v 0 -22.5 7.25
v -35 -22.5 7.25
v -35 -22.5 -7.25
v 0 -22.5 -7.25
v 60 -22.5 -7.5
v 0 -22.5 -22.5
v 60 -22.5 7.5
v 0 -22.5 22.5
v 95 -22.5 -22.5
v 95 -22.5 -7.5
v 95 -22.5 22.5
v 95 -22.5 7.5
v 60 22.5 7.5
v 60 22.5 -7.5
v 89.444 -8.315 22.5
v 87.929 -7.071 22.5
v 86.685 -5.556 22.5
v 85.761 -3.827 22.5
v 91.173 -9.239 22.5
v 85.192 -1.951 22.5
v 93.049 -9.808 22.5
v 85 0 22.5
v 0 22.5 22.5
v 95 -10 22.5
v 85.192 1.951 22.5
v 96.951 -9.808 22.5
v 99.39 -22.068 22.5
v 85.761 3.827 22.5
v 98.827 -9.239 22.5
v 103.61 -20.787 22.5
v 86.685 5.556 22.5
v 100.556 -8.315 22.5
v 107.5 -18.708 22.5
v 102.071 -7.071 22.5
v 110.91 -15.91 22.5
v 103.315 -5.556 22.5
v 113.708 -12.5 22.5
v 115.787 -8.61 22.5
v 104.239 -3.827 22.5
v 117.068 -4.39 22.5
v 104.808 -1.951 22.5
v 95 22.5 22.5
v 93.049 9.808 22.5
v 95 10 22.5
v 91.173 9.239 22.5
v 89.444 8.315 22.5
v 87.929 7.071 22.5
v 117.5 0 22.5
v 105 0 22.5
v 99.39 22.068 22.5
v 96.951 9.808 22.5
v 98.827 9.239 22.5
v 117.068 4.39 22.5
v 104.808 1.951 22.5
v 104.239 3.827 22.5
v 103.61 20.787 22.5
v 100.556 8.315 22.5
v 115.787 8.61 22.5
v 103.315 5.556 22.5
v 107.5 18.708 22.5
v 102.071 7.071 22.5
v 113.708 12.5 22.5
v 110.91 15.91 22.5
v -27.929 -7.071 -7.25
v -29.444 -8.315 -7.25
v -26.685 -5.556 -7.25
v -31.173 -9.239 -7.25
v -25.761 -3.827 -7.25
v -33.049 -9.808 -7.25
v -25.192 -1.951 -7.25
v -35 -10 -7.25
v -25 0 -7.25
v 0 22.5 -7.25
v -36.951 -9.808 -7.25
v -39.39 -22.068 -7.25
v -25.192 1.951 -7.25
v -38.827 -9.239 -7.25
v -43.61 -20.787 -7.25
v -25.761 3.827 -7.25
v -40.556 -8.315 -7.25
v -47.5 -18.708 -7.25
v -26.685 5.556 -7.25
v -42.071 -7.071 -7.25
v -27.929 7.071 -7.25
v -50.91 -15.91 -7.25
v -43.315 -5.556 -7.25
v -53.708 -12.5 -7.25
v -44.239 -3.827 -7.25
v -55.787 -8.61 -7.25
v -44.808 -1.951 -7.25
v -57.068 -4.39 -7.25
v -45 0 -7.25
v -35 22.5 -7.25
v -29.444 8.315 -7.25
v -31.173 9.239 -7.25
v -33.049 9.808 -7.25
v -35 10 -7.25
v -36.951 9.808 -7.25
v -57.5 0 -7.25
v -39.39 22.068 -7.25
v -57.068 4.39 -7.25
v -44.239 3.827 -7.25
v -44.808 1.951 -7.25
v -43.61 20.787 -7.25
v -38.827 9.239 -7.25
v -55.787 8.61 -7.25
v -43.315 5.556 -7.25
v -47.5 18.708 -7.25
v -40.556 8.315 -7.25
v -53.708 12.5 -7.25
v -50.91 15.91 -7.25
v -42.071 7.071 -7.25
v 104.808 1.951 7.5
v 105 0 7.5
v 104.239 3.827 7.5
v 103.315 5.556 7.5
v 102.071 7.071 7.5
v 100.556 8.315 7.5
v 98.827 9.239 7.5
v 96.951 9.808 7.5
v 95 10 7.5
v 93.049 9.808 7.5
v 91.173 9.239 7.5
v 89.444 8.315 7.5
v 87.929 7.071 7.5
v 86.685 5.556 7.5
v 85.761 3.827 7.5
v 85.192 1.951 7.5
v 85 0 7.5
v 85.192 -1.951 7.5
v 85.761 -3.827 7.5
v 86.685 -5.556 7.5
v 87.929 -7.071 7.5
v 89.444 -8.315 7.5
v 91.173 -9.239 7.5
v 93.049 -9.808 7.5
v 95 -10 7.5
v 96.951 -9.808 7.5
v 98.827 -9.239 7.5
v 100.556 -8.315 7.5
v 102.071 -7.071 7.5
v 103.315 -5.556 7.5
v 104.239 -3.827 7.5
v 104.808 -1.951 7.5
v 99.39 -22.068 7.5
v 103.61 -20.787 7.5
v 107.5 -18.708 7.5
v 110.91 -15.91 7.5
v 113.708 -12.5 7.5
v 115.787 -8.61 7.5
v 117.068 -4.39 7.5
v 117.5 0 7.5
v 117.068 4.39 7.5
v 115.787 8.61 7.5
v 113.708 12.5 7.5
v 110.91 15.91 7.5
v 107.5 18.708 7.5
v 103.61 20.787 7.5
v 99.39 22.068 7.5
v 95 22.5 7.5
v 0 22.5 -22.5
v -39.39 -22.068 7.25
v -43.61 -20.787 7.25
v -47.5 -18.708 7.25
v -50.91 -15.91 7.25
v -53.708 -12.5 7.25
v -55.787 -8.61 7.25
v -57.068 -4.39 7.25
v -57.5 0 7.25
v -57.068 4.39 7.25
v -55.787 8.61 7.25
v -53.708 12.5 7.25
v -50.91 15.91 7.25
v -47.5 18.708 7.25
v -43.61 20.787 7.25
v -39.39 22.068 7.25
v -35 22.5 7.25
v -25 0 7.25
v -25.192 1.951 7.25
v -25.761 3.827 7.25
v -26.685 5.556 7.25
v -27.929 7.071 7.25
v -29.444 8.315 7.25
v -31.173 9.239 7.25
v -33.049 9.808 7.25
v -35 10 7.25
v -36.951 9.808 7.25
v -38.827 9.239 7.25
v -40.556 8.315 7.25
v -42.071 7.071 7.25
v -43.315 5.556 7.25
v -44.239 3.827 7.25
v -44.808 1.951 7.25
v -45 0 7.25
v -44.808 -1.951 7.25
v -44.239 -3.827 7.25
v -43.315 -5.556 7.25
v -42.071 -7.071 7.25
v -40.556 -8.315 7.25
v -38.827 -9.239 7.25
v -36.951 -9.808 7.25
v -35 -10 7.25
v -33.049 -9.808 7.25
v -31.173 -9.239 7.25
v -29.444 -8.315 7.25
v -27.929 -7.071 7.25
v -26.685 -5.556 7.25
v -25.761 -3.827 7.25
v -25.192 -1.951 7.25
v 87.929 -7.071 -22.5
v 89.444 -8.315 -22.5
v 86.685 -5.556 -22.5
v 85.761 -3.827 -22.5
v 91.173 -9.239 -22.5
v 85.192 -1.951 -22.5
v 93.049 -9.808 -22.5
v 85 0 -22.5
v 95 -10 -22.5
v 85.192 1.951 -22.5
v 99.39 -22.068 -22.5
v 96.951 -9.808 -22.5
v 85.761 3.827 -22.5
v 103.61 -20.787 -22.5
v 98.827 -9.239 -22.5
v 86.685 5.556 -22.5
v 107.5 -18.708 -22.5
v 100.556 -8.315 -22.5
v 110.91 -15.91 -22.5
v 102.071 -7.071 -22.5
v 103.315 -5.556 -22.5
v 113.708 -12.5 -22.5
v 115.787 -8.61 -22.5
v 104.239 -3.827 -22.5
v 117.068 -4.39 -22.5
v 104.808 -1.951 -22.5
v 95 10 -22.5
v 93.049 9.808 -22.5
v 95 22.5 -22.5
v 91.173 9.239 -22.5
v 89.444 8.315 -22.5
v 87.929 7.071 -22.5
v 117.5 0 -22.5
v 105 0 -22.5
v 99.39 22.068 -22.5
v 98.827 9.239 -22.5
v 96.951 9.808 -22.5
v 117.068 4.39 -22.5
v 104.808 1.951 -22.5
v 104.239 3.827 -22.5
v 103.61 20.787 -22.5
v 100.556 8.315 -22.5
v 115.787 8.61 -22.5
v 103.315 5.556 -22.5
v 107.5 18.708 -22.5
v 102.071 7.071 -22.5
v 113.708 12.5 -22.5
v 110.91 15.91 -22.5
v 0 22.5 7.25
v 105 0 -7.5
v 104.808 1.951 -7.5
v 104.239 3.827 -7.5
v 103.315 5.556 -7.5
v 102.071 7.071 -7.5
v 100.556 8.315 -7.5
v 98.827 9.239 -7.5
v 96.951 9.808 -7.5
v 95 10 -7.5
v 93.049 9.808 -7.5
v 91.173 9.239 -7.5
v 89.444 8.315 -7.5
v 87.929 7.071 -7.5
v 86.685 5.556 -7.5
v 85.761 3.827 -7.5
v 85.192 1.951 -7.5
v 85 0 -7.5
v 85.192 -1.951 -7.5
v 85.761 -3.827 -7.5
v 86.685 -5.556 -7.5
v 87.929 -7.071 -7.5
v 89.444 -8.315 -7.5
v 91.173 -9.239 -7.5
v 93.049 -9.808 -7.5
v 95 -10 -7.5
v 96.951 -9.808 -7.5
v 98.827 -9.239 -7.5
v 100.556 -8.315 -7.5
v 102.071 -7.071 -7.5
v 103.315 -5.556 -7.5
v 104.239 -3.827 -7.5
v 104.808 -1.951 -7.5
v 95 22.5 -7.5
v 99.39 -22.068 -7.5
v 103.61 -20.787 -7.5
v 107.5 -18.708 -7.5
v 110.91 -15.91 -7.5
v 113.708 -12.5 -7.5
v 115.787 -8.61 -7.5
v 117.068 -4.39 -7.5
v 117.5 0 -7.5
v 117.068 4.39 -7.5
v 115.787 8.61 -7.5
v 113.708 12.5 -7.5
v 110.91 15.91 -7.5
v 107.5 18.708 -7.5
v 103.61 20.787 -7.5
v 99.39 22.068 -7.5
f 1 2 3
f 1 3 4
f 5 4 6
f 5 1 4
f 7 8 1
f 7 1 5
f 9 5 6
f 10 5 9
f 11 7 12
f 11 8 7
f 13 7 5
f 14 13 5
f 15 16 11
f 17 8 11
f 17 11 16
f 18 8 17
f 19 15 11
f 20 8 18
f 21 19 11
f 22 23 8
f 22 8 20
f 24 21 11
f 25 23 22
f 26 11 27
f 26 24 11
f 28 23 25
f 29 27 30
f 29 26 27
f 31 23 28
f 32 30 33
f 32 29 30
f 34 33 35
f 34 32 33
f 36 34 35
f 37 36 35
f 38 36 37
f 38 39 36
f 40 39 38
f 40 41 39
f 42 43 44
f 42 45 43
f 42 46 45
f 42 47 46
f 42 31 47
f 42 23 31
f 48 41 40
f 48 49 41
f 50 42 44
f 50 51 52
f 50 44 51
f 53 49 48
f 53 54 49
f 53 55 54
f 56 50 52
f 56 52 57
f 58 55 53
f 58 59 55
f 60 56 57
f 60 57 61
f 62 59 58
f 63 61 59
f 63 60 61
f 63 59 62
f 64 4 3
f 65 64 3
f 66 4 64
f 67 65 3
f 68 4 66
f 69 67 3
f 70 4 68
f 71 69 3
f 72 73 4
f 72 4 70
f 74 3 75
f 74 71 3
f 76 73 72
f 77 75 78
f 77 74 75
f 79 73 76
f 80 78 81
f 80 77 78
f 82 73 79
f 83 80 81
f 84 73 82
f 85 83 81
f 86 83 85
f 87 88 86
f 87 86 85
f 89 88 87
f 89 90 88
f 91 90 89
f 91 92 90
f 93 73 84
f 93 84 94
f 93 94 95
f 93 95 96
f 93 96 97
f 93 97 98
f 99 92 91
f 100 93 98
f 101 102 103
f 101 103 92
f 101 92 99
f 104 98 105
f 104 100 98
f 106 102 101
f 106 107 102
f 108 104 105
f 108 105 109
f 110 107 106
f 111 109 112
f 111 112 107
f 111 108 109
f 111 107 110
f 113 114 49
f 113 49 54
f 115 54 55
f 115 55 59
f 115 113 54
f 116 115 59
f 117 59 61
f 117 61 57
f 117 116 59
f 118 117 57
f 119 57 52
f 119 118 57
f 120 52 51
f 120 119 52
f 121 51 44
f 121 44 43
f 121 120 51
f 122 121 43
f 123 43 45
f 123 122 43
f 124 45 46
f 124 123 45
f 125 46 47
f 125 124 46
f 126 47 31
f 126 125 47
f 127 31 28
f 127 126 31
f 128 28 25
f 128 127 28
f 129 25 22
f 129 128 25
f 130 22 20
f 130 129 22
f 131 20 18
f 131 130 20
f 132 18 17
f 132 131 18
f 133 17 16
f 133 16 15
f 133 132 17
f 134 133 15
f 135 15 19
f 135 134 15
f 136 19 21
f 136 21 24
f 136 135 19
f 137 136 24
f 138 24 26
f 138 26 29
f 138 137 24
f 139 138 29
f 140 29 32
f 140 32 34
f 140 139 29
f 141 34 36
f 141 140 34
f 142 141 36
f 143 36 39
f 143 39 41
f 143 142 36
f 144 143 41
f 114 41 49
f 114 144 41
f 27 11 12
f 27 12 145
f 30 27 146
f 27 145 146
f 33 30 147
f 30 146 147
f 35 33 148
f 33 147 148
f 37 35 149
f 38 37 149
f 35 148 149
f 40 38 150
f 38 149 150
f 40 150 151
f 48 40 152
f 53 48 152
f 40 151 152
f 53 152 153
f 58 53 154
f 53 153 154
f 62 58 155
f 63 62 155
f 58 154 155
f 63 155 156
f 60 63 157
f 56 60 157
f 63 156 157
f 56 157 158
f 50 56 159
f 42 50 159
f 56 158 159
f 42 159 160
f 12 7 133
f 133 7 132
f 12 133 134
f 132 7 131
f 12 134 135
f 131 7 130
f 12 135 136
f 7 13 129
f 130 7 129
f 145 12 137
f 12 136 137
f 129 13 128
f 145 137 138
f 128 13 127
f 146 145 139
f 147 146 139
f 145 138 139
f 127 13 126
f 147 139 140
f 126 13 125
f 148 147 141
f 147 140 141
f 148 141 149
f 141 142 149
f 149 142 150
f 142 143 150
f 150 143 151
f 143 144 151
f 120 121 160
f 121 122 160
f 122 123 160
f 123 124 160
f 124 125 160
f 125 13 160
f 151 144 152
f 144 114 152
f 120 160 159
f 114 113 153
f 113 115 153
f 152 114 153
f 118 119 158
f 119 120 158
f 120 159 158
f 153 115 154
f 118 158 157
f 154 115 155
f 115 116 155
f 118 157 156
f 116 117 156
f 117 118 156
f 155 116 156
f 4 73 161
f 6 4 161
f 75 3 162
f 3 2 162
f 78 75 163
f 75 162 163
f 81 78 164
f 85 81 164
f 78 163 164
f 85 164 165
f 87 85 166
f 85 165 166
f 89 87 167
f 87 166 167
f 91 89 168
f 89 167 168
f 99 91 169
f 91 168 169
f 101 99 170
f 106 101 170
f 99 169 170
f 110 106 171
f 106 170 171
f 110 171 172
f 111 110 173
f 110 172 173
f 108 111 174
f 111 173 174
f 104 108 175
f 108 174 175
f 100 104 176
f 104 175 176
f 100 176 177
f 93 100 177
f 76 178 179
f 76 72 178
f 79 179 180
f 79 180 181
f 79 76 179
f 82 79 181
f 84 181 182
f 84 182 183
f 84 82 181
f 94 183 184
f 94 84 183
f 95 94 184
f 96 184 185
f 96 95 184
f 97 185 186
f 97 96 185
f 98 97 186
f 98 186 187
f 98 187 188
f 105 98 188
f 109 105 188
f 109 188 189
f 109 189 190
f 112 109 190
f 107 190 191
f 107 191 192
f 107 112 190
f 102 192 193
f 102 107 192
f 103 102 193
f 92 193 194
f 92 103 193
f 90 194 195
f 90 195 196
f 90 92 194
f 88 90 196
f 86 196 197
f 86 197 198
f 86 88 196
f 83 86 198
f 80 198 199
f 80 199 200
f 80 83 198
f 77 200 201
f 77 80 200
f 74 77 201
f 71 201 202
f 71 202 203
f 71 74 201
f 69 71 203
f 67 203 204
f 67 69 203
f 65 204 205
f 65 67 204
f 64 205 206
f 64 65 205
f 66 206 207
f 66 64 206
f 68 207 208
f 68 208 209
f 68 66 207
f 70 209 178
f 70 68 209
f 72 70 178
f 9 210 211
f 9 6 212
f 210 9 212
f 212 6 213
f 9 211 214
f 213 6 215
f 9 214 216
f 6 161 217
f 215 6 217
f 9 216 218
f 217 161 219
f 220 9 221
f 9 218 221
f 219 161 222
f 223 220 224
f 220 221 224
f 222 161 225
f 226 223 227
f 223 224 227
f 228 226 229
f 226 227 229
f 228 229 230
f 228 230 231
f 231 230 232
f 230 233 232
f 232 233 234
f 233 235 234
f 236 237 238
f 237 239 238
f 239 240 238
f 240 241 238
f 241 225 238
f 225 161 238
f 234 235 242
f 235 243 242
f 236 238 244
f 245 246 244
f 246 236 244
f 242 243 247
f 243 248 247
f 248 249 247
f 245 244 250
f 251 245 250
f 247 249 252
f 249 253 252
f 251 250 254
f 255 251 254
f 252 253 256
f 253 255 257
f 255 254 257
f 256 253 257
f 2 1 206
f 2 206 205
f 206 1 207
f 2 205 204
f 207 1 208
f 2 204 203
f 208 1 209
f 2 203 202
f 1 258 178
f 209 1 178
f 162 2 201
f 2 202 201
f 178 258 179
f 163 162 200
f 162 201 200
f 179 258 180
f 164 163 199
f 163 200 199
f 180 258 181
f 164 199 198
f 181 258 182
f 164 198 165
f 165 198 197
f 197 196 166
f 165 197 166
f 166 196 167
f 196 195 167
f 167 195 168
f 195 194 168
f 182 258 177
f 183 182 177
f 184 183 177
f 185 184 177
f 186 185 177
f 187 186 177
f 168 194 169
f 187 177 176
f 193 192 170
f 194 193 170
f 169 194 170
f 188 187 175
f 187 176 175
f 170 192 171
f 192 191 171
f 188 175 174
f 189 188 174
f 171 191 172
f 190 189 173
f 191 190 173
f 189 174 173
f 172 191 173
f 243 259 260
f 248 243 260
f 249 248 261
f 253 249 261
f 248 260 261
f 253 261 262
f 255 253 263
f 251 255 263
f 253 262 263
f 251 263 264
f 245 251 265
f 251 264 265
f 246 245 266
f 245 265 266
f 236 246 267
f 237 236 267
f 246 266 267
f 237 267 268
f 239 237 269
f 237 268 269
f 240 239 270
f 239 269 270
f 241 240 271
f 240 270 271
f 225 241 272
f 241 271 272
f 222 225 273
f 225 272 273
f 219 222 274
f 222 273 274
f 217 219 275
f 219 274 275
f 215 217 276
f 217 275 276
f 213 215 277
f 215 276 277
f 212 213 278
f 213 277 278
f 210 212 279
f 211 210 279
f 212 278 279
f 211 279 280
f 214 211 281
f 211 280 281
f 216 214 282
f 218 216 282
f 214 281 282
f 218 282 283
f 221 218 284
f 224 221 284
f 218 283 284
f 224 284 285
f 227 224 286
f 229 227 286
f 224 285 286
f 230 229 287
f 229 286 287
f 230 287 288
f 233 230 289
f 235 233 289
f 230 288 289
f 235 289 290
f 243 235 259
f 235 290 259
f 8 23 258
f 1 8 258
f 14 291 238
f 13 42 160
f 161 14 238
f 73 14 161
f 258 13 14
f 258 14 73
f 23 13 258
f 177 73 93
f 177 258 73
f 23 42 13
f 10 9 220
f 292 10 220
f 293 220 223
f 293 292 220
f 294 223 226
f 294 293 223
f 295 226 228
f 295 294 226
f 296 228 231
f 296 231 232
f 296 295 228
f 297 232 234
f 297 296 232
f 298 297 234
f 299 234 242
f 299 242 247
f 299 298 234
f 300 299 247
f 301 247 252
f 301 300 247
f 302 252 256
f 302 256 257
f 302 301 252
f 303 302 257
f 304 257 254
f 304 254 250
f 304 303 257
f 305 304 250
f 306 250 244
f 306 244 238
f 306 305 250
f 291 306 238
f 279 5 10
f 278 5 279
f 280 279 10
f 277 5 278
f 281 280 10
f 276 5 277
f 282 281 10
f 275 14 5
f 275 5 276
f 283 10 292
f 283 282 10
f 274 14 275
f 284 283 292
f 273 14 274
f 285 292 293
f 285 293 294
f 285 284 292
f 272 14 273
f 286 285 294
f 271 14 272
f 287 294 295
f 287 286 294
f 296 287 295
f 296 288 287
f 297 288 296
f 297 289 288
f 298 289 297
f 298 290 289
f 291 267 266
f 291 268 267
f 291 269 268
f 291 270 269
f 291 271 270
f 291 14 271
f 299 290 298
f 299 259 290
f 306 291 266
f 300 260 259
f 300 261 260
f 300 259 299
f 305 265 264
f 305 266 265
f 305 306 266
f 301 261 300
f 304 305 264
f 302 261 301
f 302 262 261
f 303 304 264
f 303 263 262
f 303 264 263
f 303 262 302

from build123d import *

# Parameters (mm, degrees)
BOSS_EXTRUDE1_DEPTH      = 7.25
BOSS_EXTRUDE1_DEPTH_BACK = 7.25
SKETCH1_R                = 10
SKETCH2_W                = 45
SKETCH2_H                = 45
BOSS_EXTRUDE2_DEPTH      = 60
SKETCH3_R                = 10
BOSS_EXTRUDE3_DEPTH      = 15


with BuildPart() as part:
    # Sketch1 → Boss-Extrude1 (new, two sides: drawn at the far end of the back side and taken through both)
    with BuildSketch(Plane.XY.offset(-BOSS_EXTRUDE1_DEPTH_BACK)):
        with BuildLine():
            Line((0, 22.5), (0, -22.5))
            Line((0, -22.5), (-35, -22.5))
            ThreePointArc((-35, -22.5), (-57.5, 0), (-35, 22.5))
            Line((-35, 22.5), (0, 22.5))
        make_face()
        with Locations((-35, 0)):
            Circle(SKETCH1_R, mode=Mode.SUBTRACT)
    extrude(amount=BOSS_EXTRUDE1_DEPTH + BOSS_EXTRUDE1_DEPTH_BACK)

    # Sketch2 → Boss-Extrude2 (add)
    with BuildSketch(Plane(origin=(0, 0, 0), x_dir=(0, 0, -1), z_dir=(1, 0, 0))):
        Rectangle(SKETCH2_W, SKETCH2_H)
    extrude(amount=BOSS_EXTRUDE2_DEPTH)

    # Sketch3 → Boss-Extrude3 (add)
    with BuildSketch(Plane.XY.offset(7.5)):
        with BuildLine():
            Line((60, 22.5), (60, -22.5))
            Line((60, -22.5), (95, -22.5))
            ThreePointArc((95, -22.5), (117.5, 0), (95, 22.5))
            Line((95, 22.5), (60, 22.5))
        make_face()
        with Locations((95, 0)):
            Circle(SKETCH3_R, mode=Mode.SUBTRACT)
    boss_extrude3 = extrude(amount=BOSS_EXTRUDE3_DEPTH)

    # Mirror1: Boss-Extrude3 across plane
    add(boss_extrude3.mirror(Plane.XY))


solid = part.part
